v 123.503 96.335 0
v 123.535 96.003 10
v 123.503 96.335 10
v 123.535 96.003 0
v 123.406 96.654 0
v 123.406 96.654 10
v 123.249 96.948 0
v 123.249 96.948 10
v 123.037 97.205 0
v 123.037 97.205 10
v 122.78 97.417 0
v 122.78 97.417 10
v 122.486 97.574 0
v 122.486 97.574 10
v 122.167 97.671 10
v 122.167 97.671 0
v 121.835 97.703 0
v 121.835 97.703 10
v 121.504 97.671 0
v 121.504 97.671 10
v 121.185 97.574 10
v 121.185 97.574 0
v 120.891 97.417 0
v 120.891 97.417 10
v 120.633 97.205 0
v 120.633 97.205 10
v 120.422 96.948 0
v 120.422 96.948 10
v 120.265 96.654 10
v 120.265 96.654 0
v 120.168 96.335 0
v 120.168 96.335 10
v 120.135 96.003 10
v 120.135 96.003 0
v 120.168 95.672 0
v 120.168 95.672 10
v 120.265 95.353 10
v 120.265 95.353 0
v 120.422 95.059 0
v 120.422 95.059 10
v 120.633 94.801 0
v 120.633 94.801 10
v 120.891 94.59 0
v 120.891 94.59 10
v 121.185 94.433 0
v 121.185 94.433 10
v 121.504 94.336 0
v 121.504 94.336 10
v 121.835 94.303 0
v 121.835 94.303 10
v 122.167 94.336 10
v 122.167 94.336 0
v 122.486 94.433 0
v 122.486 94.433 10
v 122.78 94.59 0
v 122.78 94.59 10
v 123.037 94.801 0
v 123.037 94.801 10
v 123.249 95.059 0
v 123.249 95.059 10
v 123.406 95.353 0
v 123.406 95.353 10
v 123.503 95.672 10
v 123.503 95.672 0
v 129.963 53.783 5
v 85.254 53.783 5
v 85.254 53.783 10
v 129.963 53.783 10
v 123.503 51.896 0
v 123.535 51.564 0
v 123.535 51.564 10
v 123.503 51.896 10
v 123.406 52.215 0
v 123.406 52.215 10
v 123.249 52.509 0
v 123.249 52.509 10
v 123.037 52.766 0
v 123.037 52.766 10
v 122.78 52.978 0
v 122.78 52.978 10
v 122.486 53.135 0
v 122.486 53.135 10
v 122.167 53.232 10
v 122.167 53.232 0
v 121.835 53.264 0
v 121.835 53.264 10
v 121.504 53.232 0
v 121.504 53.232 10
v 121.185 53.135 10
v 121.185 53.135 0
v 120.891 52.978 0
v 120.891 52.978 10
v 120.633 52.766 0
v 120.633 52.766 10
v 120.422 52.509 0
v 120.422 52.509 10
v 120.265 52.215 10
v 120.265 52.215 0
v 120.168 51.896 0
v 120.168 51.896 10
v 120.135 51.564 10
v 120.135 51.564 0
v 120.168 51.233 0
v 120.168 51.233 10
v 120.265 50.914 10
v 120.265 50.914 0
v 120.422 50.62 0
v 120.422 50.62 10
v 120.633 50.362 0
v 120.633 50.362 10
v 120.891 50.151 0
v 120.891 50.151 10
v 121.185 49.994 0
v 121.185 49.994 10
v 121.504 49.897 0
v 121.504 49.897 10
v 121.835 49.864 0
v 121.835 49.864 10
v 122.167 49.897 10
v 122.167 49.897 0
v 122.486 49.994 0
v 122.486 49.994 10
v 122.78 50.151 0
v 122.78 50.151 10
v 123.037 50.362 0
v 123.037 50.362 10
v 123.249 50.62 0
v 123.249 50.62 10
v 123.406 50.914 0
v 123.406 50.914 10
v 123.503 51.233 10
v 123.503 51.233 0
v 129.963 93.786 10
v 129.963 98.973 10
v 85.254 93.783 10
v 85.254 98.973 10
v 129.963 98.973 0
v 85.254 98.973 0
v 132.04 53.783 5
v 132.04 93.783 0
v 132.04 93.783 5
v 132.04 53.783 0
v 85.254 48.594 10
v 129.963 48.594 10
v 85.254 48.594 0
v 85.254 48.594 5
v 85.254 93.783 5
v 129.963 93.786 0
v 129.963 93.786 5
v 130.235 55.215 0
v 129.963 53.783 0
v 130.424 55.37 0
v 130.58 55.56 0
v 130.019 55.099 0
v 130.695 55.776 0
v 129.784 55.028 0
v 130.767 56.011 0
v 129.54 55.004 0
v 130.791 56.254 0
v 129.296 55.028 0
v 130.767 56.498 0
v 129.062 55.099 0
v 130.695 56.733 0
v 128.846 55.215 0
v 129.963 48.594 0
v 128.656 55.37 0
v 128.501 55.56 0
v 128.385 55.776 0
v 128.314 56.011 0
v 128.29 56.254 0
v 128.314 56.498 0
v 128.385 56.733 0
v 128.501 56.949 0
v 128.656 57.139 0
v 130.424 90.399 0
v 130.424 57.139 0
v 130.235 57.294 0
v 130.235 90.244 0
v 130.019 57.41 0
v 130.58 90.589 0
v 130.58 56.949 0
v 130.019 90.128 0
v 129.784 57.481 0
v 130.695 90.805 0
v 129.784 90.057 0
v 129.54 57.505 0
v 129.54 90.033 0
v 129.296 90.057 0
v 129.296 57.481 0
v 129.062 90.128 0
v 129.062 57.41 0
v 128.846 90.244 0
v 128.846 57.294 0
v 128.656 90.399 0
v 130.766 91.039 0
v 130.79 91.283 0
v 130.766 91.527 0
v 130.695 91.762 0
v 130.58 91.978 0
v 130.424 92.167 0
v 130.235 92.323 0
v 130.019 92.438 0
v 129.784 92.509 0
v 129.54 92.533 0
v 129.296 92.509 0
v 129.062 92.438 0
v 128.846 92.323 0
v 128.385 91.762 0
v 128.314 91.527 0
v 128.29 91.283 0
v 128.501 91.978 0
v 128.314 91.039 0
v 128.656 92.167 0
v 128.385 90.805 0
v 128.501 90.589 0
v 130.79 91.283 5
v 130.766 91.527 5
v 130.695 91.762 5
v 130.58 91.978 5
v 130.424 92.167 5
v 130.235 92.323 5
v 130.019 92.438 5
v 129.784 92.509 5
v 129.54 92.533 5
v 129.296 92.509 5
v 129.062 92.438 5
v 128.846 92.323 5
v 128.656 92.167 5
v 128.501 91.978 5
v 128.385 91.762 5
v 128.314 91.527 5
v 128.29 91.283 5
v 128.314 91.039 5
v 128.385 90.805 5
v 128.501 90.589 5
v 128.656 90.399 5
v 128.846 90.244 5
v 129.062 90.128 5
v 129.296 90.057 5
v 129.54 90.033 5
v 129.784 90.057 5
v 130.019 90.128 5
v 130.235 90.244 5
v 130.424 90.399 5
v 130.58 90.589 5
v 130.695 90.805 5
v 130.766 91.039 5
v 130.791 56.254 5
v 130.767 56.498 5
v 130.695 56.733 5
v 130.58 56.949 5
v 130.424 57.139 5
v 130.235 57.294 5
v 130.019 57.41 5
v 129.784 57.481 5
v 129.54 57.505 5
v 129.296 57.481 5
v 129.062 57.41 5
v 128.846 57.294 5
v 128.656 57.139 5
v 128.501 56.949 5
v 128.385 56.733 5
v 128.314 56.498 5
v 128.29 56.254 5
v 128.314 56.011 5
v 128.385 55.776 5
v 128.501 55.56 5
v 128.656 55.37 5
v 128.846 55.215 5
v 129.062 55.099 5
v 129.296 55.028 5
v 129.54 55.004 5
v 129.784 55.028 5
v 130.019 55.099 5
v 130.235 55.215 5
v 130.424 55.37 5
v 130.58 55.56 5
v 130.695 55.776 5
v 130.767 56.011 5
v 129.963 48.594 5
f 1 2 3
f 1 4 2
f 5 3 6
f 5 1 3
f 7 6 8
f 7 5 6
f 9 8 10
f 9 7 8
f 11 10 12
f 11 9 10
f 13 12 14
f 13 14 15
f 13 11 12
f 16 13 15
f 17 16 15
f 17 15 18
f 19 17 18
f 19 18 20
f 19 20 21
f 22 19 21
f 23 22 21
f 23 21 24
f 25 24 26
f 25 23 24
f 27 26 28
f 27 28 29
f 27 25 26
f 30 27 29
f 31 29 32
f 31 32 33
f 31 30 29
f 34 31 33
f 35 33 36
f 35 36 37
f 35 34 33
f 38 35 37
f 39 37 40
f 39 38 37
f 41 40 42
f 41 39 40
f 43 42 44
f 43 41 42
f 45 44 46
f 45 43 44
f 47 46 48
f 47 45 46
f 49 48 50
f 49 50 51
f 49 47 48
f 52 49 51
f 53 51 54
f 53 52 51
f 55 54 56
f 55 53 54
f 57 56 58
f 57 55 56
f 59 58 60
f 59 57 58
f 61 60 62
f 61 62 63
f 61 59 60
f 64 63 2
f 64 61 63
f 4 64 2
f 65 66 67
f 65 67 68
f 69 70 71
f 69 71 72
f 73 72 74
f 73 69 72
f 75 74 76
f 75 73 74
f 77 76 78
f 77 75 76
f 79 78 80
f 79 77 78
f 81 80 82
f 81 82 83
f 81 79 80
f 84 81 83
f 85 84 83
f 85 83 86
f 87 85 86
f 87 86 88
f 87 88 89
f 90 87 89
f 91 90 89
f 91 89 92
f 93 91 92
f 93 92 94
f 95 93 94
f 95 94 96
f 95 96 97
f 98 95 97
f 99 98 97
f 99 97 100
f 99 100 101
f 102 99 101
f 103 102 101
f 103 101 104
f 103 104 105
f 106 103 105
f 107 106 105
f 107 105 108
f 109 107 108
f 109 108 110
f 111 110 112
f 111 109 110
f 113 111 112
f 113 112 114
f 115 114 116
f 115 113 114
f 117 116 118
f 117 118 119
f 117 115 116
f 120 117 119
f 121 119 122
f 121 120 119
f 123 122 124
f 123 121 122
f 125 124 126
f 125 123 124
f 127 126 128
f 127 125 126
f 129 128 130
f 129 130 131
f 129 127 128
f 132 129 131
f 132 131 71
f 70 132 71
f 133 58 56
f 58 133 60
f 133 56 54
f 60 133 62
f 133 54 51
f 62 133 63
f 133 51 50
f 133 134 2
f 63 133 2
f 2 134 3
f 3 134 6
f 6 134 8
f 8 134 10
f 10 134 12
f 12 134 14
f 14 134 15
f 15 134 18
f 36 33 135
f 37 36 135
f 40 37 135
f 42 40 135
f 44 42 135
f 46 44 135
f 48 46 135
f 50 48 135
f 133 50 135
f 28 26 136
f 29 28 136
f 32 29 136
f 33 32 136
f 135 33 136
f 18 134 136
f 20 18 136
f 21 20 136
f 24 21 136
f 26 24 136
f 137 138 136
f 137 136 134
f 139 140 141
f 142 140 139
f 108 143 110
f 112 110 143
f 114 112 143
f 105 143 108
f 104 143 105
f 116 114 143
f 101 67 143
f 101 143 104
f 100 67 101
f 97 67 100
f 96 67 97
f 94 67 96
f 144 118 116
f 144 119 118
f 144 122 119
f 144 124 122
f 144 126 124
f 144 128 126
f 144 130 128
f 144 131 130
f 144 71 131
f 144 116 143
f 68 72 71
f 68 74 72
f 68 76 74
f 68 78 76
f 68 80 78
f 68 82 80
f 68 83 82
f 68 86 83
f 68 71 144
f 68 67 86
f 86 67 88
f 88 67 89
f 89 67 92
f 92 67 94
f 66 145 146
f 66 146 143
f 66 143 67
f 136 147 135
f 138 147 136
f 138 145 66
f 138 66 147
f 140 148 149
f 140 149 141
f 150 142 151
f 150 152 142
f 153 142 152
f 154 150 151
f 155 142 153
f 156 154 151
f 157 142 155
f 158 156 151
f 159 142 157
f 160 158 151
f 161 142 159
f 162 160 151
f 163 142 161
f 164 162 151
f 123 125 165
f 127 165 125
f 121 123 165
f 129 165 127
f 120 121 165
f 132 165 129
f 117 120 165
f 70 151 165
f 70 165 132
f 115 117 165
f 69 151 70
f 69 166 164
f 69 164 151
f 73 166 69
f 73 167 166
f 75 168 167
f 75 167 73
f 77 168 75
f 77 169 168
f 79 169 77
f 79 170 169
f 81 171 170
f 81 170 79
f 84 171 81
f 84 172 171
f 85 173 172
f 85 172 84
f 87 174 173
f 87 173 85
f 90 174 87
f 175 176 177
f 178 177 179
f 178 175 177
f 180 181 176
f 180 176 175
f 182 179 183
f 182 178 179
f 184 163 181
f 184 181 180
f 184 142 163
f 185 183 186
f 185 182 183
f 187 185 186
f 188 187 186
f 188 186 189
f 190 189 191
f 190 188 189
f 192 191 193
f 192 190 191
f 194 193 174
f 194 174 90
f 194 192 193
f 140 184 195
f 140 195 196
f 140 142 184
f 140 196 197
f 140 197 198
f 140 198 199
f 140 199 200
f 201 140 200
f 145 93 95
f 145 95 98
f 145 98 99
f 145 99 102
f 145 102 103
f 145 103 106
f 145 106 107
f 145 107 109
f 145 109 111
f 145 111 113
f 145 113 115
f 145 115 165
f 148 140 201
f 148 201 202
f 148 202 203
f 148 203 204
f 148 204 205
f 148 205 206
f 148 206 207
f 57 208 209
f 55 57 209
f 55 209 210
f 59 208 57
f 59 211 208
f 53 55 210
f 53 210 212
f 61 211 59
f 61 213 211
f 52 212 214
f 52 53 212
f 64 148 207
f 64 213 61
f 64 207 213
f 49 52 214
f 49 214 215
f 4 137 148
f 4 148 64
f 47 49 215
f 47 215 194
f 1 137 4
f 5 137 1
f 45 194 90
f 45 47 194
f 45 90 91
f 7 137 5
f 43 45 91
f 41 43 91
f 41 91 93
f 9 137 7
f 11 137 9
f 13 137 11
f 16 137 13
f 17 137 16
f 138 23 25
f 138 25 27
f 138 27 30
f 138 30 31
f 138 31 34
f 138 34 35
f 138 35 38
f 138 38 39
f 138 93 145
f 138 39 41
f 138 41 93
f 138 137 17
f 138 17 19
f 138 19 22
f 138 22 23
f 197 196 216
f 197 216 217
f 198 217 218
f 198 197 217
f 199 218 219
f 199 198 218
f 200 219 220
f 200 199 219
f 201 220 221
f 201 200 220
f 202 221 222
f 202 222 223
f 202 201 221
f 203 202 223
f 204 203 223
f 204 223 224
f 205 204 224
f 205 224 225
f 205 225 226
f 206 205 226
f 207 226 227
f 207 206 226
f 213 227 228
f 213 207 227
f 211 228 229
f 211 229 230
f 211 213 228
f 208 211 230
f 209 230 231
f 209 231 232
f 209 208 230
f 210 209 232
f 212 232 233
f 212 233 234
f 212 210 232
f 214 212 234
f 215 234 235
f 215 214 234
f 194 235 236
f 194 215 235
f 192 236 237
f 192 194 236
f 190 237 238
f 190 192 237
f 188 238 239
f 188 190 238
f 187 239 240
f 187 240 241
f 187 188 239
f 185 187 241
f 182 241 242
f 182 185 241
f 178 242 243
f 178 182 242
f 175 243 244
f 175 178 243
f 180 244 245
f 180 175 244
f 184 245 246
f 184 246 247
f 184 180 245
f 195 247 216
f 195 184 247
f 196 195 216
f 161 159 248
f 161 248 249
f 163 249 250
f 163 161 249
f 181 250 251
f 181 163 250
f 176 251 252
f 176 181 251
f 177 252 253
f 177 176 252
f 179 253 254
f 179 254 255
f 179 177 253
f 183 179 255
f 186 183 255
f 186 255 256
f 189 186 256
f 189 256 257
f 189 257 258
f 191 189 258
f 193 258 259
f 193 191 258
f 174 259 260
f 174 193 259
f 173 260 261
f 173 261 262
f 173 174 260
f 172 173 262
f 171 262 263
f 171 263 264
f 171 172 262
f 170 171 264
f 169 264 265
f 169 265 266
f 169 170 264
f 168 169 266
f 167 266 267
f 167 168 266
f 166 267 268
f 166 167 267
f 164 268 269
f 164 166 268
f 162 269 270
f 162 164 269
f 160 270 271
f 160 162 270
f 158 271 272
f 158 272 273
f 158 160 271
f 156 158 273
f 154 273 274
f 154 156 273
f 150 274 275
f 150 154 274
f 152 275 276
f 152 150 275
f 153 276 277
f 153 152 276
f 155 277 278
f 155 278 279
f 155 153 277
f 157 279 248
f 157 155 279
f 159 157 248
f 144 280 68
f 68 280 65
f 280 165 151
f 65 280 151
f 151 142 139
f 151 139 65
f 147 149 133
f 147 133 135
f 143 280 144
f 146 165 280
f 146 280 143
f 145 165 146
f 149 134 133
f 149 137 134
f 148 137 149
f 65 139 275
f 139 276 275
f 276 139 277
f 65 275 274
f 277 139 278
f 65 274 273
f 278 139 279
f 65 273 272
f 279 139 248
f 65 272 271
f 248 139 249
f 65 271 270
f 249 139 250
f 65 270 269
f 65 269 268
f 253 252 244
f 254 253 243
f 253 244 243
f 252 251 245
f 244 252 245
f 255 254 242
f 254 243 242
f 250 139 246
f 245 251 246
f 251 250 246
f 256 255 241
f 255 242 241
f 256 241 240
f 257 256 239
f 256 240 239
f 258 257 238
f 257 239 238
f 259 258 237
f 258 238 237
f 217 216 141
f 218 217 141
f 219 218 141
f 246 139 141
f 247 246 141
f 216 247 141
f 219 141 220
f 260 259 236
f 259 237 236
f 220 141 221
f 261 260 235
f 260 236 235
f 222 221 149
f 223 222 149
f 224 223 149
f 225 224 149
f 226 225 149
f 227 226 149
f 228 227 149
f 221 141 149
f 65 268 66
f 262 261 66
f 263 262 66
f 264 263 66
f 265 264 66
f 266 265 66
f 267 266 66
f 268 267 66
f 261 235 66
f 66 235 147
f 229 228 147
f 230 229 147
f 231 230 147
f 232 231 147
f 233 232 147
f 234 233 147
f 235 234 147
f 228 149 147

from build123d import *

# Parameters (mm, degrees)
SKETCH1_R           = 1.25
SKETCH1_R_2         = 1.250329794
SKETCH1_R_3         = 1.7
BOSS_EXTRUDE1_DEPTH = 5
SKETCH2_R           = 1.7
SKETCH2_W           = 44.709414805
SKETCH2_H           = 5.189
BOSS_EXTRUDE2_DEPTH = 5


with BuildPart() as part:
    # Sketch1 → Boss-Extrude1 (new body)
    with BuildSketch(Plane.XY):
        Polygon((85.253810187, 98.97317398), (129.963224992, 98.97317398), (129.963224992, 93.786173942), (132.040225419, 93.78317398), (132.040225419, 53.78317398), (129.963224992, 53.78317398), (129.963224992, 48.59417398), (85.253810187, 48.59417398), align=None)
        with Locations((129.540225419, 91.28317398)):
            Circle(SKETCH1_R, mode=Mode.SUBTRACT)
        with Locations((129.540225419, 56.254458242)):
            Circle(SKETCH1_R_2, mode=Mode.SUBTRACT)
        with Locations((121.835225419, 51.56417398)):
            Circle(SKETCH1_R_3, mode=Mode.SUBTRACT)
        with Locations((121.835225419, 96.00317398)):
            Circle(SKETCH1_R_3, mode=Mode.SUBTRACT)
    extrude(amount=BOSS_EXTRUDE1_DEPTH)

    # Sketch2 → Boss-Extrude2 (add)
    # profile 1 of 2: a face of its own
    with BuildSketch(Plane.XY.offset(5)):
        Polygon((129.963224992, 93.786173942), (85.253810187, 93.78317398), (85.253810187, 98.97317398), (129.963224992, 98.97317398), align=None)
        with Locations((121.835225419, 96.00317398)):
            Circle(SKETCH2_R, mode=Mode.SUBTRACT)
    # profile 2 of 2: a face of its own
    with BuildSketch(Plane.XY.offset(5)):
        with Locations((107.60851759, 51.18867398)):
            Rectangle(SKETCH2_W, SKETCH2_H)
        with Locations((121.835225419, 51.56417398)):
            Circle(SKETCH2_R, mode=Mode.SUBTRACT)
    extrude(amount=BOSS_EXTRUDE2_DEPTH)


solid = part.part
